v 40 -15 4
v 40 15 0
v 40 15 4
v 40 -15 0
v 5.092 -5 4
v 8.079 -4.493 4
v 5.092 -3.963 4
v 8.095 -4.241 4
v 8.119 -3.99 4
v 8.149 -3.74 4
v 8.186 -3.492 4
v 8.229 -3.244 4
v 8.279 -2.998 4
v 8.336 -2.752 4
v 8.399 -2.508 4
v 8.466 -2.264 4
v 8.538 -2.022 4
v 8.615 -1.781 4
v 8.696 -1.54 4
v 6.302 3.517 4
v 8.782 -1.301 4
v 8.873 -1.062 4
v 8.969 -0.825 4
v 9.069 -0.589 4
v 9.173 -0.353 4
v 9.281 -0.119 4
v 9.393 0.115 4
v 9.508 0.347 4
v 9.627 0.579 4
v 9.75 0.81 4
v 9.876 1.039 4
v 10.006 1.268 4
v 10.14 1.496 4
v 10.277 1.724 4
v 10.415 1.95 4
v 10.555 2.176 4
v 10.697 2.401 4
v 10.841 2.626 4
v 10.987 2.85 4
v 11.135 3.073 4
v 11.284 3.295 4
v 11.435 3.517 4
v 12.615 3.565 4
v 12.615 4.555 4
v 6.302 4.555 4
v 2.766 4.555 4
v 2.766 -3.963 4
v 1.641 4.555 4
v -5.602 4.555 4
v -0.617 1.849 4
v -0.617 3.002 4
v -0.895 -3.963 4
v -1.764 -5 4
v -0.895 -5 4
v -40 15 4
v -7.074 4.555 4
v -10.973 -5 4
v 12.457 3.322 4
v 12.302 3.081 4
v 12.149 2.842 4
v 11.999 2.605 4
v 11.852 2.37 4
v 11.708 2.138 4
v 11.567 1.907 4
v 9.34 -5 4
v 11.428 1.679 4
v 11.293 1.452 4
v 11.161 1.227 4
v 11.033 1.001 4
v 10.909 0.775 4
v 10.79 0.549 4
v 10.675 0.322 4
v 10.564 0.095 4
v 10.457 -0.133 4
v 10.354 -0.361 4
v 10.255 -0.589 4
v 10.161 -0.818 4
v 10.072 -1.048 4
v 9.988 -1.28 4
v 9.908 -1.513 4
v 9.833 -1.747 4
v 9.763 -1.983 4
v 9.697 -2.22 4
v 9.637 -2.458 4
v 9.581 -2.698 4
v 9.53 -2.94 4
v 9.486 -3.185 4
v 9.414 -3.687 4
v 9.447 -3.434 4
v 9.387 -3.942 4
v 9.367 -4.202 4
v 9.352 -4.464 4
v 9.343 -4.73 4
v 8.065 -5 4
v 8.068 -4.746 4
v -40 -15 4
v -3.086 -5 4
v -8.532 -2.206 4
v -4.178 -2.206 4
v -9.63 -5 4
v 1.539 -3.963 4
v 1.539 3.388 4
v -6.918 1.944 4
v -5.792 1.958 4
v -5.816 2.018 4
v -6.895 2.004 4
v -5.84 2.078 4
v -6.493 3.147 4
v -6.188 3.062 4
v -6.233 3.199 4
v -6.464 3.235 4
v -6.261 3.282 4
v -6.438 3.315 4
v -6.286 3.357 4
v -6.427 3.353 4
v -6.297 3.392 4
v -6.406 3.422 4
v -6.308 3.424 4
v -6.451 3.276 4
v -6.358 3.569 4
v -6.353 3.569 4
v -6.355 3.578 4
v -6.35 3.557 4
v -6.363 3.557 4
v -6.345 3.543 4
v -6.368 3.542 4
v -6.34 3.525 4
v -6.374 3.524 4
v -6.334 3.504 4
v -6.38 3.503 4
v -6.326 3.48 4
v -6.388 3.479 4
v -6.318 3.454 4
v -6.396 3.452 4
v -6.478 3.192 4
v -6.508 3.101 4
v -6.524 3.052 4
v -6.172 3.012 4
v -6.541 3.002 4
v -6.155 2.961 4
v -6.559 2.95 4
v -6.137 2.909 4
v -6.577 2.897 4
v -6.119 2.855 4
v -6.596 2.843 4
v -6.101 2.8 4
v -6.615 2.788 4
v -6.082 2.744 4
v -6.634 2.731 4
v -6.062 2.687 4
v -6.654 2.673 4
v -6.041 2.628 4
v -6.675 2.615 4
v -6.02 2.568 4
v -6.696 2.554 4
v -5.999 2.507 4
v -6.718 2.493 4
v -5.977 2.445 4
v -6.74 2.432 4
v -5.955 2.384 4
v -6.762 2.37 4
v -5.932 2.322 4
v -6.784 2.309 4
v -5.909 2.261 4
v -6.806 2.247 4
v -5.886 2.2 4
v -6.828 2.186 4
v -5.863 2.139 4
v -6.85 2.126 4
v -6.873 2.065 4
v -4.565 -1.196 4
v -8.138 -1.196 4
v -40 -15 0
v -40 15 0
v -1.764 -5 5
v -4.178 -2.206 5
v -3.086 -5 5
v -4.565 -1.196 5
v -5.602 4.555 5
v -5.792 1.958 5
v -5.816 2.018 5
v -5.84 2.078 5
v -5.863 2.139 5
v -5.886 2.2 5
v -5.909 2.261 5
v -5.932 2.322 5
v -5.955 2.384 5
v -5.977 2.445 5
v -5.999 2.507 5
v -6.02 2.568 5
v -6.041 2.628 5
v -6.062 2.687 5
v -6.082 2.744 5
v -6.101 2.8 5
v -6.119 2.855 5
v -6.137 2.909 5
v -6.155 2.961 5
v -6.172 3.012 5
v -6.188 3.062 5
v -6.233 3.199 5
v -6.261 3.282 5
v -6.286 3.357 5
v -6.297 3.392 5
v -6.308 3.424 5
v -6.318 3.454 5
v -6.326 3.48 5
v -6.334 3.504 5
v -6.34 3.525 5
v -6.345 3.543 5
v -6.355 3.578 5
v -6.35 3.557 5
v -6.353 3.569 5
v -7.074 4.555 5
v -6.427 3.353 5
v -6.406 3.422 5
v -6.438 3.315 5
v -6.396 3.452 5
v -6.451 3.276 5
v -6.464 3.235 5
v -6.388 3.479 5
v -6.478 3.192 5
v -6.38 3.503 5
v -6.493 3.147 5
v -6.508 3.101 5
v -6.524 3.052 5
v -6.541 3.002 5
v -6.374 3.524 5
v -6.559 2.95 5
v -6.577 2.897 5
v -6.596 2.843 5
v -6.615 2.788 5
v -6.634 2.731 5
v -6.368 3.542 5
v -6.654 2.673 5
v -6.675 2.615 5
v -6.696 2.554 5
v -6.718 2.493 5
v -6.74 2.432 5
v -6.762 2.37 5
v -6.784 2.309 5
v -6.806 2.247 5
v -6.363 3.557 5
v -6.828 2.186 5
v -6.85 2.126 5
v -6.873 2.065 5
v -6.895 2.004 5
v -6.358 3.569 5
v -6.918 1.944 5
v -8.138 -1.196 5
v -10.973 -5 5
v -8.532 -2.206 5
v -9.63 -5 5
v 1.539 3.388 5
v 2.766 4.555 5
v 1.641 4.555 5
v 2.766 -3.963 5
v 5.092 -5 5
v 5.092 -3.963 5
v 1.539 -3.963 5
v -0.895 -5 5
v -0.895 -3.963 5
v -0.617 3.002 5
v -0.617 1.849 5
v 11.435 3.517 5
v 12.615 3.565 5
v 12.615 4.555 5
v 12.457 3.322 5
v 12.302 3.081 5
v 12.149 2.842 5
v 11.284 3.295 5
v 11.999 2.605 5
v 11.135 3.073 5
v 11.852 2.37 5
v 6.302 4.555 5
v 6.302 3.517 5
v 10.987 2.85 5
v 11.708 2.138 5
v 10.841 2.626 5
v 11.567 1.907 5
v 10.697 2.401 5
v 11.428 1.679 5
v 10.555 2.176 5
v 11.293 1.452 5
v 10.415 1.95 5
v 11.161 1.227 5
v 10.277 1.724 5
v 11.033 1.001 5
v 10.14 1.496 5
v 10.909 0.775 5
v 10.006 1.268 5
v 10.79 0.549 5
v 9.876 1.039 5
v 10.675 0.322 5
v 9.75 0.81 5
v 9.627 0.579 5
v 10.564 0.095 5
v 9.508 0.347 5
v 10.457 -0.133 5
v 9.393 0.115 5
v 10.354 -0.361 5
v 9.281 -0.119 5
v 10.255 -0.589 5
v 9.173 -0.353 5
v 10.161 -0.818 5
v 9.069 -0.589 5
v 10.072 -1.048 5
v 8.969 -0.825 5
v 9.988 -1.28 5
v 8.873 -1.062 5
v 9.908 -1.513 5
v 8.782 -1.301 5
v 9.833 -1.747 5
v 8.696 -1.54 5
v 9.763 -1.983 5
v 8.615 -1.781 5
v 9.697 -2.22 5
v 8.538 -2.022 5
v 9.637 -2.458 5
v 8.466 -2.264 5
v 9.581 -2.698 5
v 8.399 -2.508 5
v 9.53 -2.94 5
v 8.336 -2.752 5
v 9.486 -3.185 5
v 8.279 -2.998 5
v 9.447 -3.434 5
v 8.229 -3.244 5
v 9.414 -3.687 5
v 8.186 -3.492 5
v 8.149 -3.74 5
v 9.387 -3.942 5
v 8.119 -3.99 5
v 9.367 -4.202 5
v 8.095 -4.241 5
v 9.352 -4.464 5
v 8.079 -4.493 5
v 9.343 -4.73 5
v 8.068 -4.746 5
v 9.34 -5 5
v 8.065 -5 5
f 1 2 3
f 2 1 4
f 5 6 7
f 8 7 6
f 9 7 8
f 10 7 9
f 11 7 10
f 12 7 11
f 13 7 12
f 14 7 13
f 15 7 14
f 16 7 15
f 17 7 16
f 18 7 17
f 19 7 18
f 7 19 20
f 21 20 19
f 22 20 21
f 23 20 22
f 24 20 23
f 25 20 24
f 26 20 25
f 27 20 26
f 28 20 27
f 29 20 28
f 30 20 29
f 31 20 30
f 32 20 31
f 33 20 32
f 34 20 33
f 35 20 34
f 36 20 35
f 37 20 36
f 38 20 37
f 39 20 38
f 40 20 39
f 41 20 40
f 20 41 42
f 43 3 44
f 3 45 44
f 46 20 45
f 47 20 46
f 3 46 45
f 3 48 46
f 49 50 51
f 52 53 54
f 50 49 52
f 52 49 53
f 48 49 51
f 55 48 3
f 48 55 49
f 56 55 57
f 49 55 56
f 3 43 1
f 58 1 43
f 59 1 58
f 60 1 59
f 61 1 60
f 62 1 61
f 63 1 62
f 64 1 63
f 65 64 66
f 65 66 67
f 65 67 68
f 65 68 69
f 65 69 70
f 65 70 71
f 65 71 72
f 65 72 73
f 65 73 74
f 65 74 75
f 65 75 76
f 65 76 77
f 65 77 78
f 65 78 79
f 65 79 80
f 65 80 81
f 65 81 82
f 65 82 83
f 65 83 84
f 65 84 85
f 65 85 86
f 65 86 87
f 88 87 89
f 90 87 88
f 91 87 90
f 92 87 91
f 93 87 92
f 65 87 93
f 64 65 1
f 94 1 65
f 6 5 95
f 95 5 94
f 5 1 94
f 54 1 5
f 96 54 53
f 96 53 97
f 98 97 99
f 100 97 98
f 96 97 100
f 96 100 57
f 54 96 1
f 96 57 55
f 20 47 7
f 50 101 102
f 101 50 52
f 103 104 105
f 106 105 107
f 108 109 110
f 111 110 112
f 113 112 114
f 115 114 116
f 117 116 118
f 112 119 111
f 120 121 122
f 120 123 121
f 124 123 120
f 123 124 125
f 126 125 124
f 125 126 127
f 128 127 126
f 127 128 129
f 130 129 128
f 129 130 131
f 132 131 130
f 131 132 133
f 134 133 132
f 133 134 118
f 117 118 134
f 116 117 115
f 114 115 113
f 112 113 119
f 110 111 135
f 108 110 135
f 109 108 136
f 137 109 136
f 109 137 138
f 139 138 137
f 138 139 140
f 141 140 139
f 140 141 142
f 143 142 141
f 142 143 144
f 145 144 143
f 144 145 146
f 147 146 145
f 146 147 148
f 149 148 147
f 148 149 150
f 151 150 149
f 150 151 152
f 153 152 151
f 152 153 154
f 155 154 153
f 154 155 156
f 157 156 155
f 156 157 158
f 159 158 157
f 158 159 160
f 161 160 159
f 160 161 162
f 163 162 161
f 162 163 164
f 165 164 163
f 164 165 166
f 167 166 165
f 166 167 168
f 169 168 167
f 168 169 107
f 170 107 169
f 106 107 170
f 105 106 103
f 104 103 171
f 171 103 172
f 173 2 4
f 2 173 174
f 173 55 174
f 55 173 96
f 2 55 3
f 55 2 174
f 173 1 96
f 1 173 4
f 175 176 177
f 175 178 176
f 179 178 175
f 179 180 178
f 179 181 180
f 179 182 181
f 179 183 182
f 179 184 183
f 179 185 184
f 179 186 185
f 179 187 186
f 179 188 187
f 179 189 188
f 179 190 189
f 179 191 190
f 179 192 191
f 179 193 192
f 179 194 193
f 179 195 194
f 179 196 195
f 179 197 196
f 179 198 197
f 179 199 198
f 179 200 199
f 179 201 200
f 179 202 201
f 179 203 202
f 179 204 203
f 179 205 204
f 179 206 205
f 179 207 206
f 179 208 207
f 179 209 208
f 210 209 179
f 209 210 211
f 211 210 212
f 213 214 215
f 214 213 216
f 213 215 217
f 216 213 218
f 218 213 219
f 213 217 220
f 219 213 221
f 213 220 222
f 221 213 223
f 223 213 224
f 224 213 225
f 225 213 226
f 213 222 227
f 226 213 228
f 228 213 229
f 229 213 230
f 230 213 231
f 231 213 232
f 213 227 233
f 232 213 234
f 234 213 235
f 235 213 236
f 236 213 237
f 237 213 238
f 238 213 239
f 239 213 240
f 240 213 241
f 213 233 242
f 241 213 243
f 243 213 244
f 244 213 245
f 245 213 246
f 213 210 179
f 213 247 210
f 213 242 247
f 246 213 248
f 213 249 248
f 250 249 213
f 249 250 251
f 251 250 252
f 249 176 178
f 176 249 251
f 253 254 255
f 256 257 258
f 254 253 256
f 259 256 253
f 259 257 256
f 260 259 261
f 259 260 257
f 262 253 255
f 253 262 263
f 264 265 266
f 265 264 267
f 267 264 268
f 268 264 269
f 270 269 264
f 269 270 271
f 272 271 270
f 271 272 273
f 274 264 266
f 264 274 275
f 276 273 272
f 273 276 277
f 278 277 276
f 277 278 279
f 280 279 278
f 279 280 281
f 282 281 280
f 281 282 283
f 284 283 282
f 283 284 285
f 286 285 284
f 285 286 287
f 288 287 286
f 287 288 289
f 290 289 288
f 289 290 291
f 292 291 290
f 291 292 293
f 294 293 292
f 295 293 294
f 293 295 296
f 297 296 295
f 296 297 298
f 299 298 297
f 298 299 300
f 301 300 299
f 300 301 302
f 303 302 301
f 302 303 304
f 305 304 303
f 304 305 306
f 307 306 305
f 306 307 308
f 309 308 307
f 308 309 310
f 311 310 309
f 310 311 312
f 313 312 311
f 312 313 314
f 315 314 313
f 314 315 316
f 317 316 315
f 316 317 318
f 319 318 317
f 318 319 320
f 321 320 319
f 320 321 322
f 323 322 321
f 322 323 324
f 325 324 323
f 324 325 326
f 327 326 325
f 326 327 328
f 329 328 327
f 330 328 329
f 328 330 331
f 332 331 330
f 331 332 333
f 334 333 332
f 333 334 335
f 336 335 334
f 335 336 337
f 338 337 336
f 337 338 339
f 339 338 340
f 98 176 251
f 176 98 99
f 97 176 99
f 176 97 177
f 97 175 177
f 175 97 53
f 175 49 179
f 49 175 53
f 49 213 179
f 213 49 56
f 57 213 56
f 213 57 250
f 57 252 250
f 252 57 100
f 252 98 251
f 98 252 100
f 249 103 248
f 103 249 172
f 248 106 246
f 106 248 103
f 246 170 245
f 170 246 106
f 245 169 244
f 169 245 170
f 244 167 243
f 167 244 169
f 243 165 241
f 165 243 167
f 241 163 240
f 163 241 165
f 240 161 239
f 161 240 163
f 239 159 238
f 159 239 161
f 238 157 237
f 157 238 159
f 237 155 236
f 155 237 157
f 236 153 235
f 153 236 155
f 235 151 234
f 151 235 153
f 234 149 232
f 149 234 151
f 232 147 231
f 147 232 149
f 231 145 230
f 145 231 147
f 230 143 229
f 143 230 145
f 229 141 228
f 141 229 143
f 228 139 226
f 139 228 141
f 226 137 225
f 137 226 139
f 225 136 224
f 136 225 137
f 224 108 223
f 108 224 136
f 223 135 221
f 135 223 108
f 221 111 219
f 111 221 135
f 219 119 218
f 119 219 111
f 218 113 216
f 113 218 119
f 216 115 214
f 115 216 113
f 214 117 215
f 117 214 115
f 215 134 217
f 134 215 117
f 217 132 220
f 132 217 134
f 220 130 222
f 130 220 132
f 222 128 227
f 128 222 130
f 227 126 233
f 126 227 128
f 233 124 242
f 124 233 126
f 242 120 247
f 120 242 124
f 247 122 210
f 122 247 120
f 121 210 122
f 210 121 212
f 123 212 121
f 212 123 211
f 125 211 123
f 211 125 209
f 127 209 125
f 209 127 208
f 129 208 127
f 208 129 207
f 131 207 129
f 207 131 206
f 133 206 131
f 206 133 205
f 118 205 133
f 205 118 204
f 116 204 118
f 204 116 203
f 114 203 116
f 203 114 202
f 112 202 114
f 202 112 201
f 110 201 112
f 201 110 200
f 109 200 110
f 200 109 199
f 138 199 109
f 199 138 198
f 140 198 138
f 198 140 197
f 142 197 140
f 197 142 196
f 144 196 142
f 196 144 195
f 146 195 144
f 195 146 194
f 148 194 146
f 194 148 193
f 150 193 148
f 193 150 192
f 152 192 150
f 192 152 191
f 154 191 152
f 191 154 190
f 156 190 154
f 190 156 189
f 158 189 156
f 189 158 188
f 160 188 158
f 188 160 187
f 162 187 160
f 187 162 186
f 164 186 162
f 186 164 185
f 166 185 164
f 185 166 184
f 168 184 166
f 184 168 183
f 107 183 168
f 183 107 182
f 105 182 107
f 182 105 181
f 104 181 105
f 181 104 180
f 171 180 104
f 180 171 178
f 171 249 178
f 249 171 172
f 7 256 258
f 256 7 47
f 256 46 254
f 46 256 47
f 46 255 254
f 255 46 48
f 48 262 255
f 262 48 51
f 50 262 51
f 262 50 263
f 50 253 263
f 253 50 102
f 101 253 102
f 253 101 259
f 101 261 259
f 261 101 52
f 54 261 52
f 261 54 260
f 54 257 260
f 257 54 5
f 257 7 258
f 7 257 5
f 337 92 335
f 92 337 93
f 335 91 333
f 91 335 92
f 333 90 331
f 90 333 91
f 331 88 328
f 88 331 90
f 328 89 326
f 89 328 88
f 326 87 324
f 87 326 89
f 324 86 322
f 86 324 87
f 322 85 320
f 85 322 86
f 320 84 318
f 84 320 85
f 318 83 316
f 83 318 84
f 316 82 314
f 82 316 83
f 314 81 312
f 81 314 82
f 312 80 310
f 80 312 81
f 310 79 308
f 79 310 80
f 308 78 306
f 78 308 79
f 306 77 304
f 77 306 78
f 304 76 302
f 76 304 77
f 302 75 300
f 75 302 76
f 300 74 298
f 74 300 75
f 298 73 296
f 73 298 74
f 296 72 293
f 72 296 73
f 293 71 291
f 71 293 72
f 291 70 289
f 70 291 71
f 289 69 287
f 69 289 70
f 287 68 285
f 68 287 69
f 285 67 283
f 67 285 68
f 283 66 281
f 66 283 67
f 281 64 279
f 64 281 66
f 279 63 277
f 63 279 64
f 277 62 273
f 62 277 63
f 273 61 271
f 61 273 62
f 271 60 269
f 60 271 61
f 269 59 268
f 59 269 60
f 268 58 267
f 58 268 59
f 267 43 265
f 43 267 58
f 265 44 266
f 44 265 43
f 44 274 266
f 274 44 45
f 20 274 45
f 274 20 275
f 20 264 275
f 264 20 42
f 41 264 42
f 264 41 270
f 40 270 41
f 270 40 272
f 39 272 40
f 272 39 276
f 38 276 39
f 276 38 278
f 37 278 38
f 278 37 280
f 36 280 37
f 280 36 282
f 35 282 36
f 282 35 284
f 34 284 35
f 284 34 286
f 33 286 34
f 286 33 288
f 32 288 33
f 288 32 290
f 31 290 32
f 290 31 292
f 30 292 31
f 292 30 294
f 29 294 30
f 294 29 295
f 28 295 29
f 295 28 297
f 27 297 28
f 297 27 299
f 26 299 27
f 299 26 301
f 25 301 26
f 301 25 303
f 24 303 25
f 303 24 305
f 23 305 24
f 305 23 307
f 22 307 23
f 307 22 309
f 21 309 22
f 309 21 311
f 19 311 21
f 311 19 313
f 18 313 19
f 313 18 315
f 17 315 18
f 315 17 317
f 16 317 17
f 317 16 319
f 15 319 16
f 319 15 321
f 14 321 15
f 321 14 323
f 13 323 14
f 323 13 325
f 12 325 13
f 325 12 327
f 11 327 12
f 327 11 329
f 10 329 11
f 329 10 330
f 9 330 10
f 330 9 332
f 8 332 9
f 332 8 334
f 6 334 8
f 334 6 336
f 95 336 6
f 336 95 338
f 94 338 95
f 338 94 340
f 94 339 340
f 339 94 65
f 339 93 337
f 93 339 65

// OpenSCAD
// Generated with SolidPython2 for OpenSCAD task-030
$fn = 64;

union() {
	translate(v = [-40.0, -15.0, 0]) {
		cube(size = [80, 30, 4]);
	}
	translate(v = [-11, -5, 4]) {
		linear_extrude(height = 1) {
			text(size = 10, text = "A17");
		}
	}
}
